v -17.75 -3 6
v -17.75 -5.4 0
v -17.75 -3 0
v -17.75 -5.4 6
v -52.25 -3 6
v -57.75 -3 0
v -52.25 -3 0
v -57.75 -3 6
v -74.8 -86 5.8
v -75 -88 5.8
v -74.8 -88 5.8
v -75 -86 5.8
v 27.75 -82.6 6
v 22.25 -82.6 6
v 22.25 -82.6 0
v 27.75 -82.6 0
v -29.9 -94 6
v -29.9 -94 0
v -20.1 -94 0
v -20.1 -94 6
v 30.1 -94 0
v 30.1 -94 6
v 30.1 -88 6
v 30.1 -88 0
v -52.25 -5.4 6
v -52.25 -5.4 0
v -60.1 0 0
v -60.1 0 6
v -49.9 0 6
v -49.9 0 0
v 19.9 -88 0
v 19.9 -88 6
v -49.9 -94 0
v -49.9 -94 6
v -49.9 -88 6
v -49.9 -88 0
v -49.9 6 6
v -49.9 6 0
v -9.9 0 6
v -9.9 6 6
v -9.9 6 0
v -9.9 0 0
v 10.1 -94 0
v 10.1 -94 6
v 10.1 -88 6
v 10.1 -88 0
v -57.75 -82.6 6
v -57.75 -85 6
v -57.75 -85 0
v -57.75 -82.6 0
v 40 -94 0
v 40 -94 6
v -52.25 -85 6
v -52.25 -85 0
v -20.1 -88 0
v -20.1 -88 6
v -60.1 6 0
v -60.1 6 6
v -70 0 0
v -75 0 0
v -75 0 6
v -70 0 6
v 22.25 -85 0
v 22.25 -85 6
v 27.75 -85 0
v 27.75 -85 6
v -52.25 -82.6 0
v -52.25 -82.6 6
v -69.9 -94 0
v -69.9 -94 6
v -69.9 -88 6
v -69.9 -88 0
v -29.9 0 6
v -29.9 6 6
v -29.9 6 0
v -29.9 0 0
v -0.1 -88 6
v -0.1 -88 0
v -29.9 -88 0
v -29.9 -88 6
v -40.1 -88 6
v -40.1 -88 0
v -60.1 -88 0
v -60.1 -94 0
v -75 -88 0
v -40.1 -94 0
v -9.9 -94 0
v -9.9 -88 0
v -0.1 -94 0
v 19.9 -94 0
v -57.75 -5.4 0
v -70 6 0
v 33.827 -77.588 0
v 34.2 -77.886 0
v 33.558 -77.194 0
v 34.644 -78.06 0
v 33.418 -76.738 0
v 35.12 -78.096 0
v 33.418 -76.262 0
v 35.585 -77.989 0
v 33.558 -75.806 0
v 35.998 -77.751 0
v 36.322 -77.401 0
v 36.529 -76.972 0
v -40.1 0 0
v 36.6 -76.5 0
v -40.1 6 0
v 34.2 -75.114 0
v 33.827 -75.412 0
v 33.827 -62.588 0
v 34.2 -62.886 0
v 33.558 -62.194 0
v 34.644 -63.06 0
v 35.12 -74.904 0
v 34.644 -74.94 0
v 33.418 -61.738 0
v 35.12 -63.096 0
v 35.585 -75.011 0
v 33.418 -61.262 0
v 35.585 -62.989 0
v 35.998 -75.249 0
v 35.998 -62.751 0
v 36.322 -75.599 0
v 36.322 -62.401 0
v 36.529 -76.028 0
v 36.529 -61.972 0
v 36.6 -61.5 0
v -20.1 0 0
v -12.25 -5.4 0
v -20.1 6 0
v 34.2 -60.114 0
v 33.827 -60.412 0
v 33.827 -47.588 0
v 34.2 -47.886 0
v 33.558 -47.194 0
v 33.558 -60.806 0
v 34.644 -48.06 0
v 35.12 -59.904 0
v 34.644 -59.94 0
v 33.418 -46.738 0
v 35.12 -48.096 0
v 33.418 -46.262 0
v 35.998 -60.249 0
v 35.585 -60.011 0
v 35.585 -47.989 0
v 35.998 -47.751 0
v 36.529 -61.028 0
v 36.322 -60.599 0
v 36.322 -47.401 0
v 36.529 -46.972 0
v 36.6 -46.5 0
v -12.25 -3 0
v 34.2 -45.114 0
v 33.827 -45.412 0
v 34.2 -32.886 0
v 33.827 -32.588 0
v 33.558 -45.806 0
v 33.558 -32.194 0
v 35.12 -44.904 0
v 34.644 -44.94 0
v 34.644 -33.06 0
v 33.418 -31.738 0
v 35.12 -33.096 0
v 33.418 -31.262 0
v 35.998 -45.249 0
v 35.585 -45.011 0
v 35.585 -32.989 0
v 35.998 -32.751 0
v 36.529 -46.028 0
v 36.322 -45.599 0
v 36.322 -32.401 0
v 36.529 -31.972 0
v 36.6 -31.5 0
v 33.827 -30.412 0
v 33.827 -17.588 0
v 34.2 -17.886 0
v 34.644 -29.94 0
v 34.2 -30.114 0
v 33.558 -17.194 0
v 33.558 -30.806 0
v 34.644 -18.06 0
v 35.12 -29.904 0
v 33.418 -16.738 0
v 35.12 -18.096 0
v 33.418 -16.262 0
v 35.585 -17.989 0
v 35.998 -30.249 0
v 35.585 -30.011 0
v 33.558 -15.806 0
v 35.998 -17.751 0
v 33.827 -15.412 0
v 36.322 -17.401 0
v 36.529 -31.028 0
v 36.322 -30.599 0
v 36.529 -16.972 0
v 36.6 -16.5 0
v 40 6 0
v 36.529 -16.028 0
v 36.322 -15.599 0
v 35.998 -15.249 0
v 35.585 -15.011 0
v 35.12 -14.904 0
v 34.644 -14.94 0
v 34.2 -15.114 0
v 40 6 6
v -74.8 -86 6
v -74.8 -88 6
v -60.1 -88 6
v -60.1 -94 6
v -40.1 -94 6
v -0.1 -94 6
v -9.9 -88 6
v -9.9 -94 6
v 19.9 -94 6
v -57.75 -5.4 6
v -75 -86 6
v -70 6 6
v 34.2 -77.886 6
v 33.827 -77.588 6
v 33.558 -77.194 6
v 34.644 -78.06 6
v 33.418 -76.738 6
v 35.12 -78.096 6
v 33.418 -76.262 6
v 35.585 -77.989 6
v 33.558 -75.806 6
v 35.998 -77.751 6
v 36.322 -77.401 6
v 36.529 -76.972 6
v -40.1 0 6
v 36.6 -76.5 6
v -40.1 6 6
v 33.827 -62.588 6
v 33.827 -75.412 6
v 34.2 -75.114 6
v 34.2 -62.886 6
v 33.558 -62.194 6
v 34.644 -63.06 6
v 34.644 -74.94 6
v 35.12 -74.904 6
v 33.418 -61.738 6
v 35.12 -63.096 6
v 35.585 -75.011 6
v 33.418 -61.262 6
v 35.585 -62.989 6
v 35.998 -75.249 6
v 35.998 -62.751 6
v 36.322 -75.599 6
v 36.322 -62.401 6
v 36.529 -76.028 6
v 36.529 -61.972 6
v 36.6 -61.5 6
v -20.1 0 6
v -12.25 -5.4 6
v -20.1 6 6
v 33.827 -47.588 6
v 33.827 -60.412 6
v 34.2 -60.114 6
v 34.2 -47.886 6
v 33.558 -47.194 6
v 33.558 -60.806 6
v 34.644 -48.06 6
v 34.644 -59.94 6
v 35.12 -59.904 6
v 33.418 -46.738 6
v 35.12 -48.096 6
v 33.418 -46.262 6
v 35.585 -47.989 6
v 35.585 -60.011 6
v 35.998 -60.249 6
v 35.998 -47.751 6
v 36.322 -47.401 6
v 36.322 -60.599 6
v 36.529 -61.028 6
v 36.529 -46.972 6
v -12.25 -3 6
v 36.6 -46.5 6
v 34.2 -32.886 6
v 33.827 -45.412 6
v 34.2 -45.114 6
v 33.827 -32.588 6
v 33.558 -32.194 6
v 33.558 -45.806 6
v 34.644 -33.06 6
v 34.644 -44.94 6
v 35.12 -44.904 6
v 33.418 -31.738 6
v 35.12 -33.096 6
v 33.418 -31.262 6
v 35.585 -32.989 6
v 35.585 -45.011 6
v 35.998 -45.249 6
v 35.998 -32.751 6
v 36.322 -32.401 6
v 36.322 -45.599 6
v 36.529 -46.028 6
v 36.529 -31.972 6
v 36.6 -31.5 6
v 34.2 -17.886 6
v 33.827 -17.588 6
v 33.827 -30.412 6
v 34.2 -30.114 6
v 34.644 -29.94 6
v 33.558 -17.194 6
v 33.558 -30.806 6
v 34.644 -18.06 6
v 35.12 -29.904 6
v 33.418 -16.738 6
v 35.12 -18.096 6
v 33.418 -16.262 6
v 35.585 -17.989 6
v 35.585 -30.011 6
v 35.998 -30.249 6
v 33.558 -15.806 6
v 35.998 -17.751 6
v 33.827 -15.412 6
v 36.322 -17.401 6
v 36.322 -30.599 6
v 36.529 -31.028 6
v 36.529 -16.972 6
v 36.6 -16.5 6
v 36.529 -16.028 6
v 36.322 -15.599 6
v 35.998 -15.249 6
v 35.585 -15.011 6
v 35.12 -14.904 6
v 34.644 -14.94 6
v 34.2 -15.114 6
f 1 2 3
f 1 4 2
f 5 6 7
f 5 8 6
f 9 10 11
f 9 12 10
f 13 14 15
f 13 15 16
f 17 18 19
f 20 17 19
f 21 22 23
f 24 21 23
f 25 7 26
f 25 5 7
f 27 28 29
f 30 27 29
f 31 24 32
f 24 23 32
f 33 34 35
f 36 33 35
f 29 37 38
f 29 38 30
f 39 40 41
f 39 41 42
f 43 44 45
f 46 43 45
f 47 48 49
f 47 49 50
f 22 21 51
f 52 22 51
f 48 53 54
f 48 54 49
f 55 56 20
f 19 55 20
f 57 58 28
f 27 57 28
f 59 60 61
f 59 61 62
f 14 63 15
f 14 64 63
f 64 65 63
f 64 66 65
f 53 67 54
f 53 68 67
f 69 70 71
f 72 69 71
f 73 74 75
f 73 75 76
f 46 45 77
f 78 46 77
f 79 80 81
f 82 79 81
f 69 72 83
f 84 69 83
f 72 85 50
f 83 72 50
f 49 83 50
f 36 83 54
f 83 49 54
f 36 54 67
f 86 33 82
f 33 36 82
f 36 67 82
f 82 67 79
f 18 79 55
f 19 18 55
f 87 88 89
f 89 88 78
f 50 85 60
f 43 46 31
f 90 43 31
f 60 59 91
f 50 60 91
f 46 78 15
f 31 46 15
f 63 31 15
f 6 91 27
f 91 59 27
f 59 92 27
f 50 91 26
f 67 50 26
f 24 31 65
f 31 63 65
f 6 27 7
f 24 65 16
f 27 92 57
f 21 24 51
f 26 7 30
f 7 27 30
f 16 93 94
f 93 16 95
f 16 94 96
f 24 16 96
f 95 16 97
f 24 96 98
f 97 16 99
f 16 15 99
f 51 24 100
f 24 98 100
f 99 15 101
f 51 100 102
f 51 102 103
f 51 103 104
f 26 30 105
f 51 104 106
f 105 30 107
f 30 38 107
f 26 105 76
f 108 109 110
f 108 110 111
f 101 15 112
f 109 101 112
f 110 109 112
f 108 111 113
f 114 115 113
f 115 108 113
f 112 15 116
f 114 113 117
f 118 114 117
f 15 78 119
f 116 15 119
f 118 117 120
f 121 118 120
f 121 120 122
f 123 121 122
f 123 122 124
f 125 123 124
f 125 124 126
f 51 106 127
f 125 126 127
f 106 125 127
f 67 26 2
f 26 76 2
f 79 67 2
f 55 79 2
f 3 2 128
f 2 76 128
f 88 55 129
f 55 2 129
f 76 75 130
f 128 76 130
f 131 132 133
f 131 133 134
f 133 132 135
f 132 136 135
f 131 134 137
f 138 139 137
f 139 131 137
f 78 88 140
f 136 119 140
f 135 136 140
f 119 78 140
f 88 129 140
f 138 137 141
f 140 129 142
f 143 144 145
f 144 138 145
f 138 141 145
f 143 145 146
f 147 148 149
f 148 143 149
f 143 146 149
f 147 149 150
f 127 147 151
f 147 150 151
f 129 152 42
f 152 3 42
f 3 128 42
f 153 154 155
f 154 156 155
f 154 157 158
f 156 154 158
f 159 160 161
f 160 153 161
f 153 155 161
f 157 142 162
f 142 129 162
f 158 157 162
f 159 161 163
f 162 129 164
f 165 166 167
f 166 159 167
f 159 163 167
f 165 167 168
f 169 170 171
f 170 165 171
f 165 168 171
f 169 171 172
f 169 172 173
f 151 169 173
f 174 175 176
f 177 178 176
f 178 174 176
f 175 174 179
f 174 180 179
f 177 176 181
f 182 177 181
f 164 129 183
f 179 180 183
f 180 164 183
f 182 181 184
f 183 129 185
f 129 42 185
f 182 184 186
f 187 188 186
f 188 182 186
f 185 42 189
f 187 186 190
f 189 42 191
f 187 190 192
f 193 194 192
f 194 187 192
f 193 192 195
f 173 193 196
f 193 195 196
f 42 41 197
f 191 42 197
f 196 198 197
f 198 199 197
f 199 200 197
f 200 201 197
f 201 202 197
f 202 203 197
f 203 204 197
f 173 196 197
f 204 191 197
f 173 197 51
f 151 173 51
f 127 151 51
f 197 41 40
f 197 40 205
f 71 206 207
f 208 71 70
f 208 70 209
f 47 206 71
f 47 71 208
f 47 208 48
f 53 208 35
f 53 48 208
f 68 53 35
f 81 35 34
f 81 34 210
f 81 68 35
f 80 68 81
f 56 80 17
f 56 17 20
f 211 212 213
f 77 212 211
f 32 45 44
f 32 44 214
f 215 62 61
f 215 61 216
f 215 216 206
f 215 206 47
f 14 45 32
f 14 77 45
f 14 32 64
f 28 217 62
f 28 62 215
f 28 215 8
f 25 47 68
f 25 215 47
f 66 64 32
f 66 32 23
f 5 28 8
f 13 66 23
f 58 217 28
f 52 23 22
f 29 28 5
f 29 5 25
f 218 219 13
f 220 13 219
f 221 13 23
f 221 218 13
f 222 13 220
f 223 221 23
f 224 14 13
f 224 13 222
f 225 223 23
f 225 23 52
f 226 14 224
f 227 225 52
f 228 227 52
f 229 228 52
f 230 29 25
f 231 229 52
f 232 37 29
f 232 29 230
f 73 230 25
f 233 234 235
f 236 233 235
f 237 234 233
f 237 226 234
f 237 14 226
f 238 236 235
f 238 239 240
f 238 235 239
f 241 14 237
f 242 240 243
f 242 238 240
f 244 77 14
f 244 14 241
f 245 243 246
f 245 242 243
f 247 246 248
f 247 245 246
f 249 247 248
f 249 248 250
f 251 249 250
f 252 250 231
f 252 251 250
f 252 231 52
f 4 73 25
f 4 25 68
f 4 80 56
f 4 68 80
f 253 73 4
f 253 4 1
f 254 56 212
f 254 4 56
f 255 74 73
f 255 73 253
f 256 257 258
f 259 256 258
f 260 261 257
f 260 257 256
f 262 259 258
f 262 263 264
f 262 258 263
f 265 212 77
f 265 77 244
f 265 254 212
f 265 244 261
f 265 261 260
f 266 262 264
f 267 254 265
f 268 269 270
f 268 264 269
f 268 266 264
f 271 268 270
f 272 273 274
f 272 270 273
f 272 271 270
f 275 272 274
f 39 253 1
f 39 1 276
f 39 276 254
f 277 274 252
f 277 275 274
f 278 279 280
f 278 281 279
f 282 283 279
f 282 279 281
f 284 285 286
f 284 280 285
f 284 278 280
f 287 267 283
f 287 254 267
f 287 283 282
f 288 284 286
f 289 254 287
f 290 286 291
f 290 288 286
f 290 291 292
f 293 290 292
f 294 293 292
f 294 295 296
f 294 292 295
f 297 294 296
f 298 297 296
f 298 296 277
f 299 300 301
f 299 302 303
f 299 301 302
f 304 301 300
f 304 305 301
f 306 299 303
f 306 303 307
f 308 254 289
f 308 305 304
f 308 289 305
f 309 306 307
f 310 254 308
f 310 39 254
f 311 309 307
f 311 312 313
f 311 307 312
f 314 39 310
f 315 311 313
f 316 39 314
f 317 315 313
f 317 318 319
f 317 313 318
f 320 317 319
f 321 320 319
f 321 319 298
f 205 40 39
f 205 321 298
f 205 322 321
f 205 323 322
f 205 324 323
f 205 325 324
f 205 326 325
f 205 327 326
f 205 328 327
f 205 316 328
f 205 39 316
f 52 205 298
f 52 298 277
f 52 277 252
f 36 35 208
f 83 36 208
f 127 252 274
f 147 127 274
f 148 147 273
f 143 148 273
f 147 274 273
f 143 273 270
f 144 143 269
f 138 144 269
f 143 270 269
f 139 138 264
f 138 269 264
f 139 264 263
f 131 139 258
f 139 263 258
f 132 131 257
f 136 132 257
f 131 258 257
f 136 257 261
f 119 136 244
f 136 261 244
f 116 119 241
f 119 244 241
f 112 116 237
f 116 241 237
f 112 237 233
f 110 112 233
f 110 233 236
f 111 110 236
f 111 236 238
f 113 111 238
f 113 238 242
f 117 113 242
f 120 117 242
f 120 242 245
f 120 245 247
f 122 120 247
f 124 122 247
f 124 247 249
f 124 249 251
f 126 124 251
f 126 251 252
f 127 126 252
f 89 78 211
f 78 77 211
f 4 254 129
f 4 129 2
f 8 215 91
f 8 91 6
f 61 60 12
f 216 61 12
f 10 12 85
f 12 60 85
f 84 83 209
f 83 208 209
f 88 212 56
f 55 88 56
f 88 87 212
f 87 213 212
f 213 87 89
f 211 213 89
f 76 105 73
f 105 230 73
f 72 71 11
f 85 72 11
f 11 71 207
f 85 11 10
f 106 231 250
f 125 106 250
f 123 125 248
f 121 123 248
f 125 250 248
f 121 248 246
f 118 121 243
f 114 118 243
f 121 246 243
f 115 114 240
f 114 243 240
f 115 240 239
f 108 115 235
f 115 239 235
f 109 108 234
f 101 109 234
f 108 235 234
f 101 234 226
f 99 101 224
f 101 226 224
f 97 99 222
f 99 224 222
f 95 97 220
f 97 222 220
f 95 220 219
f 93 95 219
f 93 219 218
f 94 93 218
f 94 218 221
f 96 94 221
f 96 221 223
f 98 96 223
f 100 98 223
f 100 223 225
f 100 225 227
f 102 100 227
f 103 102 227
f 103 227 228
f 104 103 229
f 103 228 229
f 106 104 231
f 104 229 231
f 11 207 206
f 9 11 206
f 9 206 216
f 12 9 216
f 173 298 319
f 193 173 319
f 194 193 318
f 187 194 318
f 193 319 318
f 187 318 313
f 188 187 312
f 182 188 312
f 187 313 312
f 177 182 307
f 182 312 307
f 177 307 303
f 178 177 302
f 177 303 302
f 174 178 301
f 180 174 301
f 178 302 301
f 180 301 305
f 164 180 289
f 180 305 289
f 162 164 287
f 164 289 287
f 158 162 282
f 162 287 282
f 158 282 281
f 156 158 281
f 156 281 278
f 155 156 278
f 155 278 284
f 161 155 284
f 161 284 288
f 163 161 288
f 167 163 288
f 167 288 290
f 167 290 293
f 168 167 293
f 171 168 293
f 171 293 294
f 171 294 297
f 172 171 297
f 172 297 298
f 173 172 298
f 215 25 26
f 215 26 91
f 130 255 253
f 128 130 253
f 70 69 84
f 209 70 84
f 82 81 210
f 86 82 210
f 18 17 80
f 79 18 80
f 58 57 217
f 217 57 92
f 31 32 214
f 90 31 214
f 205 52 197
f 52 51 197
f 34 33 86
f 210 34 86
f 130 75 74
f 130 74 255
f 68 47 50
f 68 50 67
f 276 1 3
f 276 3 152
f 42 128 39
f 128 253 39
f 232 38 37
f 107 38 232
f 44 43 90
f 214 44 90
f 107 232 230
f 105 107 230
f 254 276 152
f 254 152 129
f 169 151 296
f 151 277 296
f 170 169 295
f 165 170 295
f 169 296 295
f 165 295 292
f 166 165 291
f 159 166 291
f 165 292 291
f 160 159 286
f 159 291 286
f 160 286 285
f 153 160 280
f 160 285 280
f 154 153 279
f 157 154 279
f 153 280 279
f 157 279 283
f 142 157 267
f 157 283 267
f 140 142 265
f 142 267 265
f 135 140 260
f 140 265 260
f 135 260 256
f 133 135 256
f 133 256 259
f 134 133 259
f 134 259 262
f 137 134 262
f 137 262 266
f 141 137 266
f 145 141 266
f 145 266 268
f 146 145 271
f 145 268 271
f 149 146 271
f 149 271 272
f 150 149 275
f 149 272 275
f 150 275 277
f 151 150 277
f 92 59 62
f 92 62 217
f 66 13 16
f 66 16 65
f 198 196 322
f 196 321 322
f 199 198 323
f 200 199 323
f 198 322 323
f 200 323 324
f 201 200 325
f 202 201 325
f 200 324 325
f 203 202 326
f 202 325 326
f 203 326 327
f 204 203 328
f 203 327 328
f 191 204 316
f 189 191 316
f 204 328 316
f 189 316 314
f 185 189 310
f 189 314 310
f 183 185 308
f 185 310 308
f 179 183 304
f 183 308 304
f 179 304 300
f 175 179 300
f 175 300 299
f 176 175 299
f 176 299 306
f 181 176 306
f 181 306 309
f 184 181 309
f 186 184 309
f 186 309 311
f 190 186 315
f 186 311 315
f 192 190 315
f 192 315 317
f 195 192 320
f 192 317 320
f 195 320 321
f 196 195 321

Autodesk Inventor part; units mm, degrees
ref_plane "YZ Plane" through (0, 0, 0) normal (1, 0, 0) x (0, 1, 0)
ref_plane "XZ Plane" through (0, 0, 0) normal (0, 1, 0) x (-1, 0, 0)
ref_plane "XY Plane" through (0, 0, 0) normal (0, 0, 1) x (1, 0, 0)
sketch "Sketch1" plane through (0, 0, 0) normal (0, 0, 1) x (1, 0, 0)
  line L0 (-20, 6) -> (-10, 6) projected
  line L1 (-70, 0) -> (-70, 6) projected
  line L2 (-75, 6) -> (-70, 6) projected
  line L3 (-75, 0) -> (-75, 6) projected
  line L4 (-75, 0) -> (-70, 0) projected
  line L5 (40, -67) -> (40, -9) projected
  line L6 (40, 6) -> (-75, 6)
  line L7 (-75, 6) -> (-75, -94)
  line L8 (-75, -94) -> (40, -94)
  line L9 (40, -94) -> (40, 6)
  dimension "d85" = 115
  dimension "d86" = 100
extrude "Extrusion1" add sketch "Sketch1" along normal blind 6 contours L0 L6 L9 L5 L8 L7 L4 L1
ref_plane "Work Plane1" through (-75, -44, 0) normal (0, -1, 0) x (1, 0, 0)
sketch "Sketch2" plane through (0, 0, 6) normal (0, 0, 1) x (1, 0, 0)
  line L0 (-60, 6) -> (-60, 0) projected
  line L1 (-60, 0) -> (-50, 0) projected
  line L2 (-50, 0) -> (-50, 6) projected
  line L3 (-40, 0) -> (-30, 0) projected
  line L4 (-30, 0) -> (-30, 6) projected
  line L5 (-40, 6) -> (-40, 0) projected
  line L6 (-20, 0) -> (-10, 0) projected
  line L7 (-20, 6) -> (-20, 0) projected
  line L8 (-10, 0) -> (-10, 6) projected
  line L9 (40, 6) -> (-70, 6) projected
  line L10 (-50, 6) -> (-49.9, 6)
  line L11 (-49.9, 6) -> (-49.9, 0)
  line L12 (-49.9, 0) -> (-50, 0)
  line L13 (-50, 0) -> (-50, 6)
  line L14 (-60, 6) -> (-60.1, 6)
  line L15 (-60.1, 6) -> (-60.1, 0)
  line L16 (-60.1, 0) -> (-60, 0)
  line L17 (-60, 0) -> (-60, 6)
  point P0 (0, 0)
  dimension "d5" = 0.1
  dimension "d6" = 6
  dimension "d7" = 0.1
  dimension "d8" = 6
extrude "Extrusion2" cut sketch "Sketch2" against normal blind 6 contours L9 L2 L1 L0 | L0 L16 L15 L9 | L9 L11 L12 L2
pattern_linear "Rectangular Pattern1" count 3 spacing 20 along (1, 0, 0) of "Extrusion2"
sketch "Sketch3" plane through (0, 0, 6) normal (0, 0, 1) x (1, 0, 0)
  circle A0 centre (35, -76.5) radius 1.6
  line L0 (-90, -94) -> (40, -94) projected
  line L1 (40, -94) -> (40, 6) projected
  circle A1 centre (35, -61.5) radius 1.6
  circle A2 centre (35, -46.5) radius 1.6
  circle A3 centre (35, -31.5) radius 1.6
  circle A4 centre (35, -16.5) radius 1.6
  point P0 (0, 0)
  point P1 (35, -59)
  point P2 (35, -39)
  point P3 (35, -29)
  point P4 (35, -49)
  point P5 (35, -19)
  dimension "d73" = 3.2
  dimension "d74" = 17.5
  dimension "d75" = 5
  dimension "d78" = 15
sketch "Sketch4" plane through (0, 0, 6) normal (0, 0, 1) x (1, 0, 0)
  line L0 (-60.1, 0) -> (-60.1, 6) projected
  line L1 (-60, 0) -> (-50, 0) projected
  line L2 (-49.9, 6) -> (-49.9, 0) projected
  line L3 (-49.9, 0) -> (-60.1, 0) projected
  line L4 (66, -44) -> (-116, -44) projected
  line L5 (-60.1, -88) -> (-60.1, -94)
  line L6 (-49.9, -94) -> (-49.9, -88)
  line L7 (-49.9, -88) -> (-60.1, -88)
  line L8 (-90, -94) -> (40, -94) projected
  line L9 (-69.9, -94) -> (-69.9, -88)
  line L10 (-69.9, -88) -> (-80.1, -88)
  line L11 (-80.1, -88) -> (-80.1, -94)
  line L12 (-29.9, -94) -> (-29.9, -88)
  line L13 (-29.9, -88) -> (-40.1, -88)
  line L14 (-40.1, -88) -> (-40.1, -94)
  line L15 (-49.9, -94) -> (-49.9, -88)
  line L16 (-49.9, -88) -> (-60.1, -88)
  line L17 (-60.1, -88) -> (-60.1, -94)
  line L18 (-9.9, -94) -> (-9.9, -88)
  line L19 (-9.9, -88) -> (-20.1, -88)
  line L20 (-20.1, -88) -> (-20.1, -94)
  line L21 (-29.9, -94) -> (-29.9, -88)
  line L22 (-29.9, -88) -> (-40.1, -88)
  line L23 (-40.1, -88) -> (-40.1, -94)
  line L24 (10.1, -94) -> (10.1, -88)
  line L25 (10.1, -88) -> (-0.1, -88)
  line L26 (-0.1, -88) -> (-0.1, -94)
  line L27 (-9.9, -94) -> (-9.9, -88)
  line L28 (-9.9, -88) -> (-20.1, -88)
  line L29 (-20.1, -88) -> (-20.1, -94)
  line L30 (30.1, -94) -> (30.1, -88)
  line L31 (30.1, -88) -> (19.9, -88)
  line L32 (19.9, -88) -> (19.9, -94)
  line L33 (10.1, -94) -> (10.1, -88)
  line L34 (10.1, -88) -> (-0.1, -88)
  line L35 (-0.1, -88) -> (-0.1, -94)
  point P0 (0, 0)
  point P1 (19.9, -94)
  point P2 (30.1, -94)
  point P3 (-0.1, -94)
  point P4 (10.1, -94)
  point P5 (-20.1, -94)
  point P6 (-9.9, -94)
  point P7 (-40.1, -94)
  point P8 (-29.9, -94)
  point P9 (-80.1, -94)
  point P10 (-69.9, -94)
  dimension "d16" = 20
  dimension "d19" = 20
extrude "Extrusion4" cut sketch "Sketch4" against normal blind 6
sketch "Sketch6" plane through (0, 0, 6) normal (0, 0, 1) x (1, 0, 0)
  line L0 (-69.9, -88) -> (-75, -88) projected
  line L1 (-75, -88) -> (-74.8, -88)
  line L2 (-74.8, -88) -> (-74.8, -86)
  line L3 (-74.8, -86) -> (-75, -86)
  line L4 (-75, -86) -> (-75, -88)
  line L5 (-75, -88) -> (-75.2, -88)
  line L6 (-75.2, -88) -> (-75.2, -86)
  line L7 (-75.2, -86) -> (-75, -86)
  line L8 (-75, -86) -> (-75, -88)
  point P0 (0, 0)
  point P1 (-80.1, -88)
  dimension "d40" = 0.2
  dimension "d41" = 2
  dimension "d42" = 0.2
  dimension "d43" = 2
extrude "Extrusion6" cut sketch "Sketch6" against normal blind 0.2
sketch "Sketch7" plane through (0, 0, 6) normal (0, 0, 1) x (1, 0, 0)
  line L0 (27.75, -85) -> (22.25, -85)
  line L1 (22.25, -85) -> (22.25, -82.6)
  line L2 (22.25, -82.6) -> (27.75, -82.6)
  line L3 (27.75, -82.6) -> (27.75, -85)
  line L4 (10.1, -94) -> (19.9, -94) projected
  line L5 (30.1, -88) -> (30.1, -94) projected
  line L6 (-57.75, -82.6) -> (-52.25, -82.6)
  line L7 (-52.25, -82.6) -> (-52.25, -85)
  line L8 (-52.25, -85) -> (-57.75, -85)
  line L9 (-57.75, -85) -> (-57.75, -82.6)
  line L10 (-12.25, -5.4) -> (-17.75, -5.4)
  line L11 (-17.75, -5.4) -> (-17.75, -3)
  line L12 (-17.75, -3) -> (-12.25, -3)
  line L13 (-12.25, -3) -> (-12.25, -5.4)
  line L14 (-20.1, 6) -> (-29.9, 6) projected
  line L15 (-9.9, 6) -> (-9.9, 0) projected
  line L16 (-52.25, -5.4) -> (-57.75, -5.4)
  line L17 (-57.75, -3) -> (-52.25, -3)
  line L18 (-52.25, -3) -> (-52.25, -5.4)
  line L19 (-57.75, -5.4) -> (-57.75, -3)
  point P0 (0, 0)
  dimension "d4" = 0
  dimension "d49" = 5.5
  dimension "d50" = 2.4
  dimension "d51" = 9
  dimension "d52" = 2.35
  dimension "d55" = 80
  dimension "d60" = 5.5
  dimension "d61" = 2.4
  dimension "d62" = 9
  dimension "d63" = 2.35
  dimension "d66" = 40
extrude "Extrusion7" cut sketch "Sketch7" against normal blind 6
extrude "Extrusion8" cut sketch "Sketch3" against normal through all
properties part number "00_Baseplate_Simmo_side2_v2"
